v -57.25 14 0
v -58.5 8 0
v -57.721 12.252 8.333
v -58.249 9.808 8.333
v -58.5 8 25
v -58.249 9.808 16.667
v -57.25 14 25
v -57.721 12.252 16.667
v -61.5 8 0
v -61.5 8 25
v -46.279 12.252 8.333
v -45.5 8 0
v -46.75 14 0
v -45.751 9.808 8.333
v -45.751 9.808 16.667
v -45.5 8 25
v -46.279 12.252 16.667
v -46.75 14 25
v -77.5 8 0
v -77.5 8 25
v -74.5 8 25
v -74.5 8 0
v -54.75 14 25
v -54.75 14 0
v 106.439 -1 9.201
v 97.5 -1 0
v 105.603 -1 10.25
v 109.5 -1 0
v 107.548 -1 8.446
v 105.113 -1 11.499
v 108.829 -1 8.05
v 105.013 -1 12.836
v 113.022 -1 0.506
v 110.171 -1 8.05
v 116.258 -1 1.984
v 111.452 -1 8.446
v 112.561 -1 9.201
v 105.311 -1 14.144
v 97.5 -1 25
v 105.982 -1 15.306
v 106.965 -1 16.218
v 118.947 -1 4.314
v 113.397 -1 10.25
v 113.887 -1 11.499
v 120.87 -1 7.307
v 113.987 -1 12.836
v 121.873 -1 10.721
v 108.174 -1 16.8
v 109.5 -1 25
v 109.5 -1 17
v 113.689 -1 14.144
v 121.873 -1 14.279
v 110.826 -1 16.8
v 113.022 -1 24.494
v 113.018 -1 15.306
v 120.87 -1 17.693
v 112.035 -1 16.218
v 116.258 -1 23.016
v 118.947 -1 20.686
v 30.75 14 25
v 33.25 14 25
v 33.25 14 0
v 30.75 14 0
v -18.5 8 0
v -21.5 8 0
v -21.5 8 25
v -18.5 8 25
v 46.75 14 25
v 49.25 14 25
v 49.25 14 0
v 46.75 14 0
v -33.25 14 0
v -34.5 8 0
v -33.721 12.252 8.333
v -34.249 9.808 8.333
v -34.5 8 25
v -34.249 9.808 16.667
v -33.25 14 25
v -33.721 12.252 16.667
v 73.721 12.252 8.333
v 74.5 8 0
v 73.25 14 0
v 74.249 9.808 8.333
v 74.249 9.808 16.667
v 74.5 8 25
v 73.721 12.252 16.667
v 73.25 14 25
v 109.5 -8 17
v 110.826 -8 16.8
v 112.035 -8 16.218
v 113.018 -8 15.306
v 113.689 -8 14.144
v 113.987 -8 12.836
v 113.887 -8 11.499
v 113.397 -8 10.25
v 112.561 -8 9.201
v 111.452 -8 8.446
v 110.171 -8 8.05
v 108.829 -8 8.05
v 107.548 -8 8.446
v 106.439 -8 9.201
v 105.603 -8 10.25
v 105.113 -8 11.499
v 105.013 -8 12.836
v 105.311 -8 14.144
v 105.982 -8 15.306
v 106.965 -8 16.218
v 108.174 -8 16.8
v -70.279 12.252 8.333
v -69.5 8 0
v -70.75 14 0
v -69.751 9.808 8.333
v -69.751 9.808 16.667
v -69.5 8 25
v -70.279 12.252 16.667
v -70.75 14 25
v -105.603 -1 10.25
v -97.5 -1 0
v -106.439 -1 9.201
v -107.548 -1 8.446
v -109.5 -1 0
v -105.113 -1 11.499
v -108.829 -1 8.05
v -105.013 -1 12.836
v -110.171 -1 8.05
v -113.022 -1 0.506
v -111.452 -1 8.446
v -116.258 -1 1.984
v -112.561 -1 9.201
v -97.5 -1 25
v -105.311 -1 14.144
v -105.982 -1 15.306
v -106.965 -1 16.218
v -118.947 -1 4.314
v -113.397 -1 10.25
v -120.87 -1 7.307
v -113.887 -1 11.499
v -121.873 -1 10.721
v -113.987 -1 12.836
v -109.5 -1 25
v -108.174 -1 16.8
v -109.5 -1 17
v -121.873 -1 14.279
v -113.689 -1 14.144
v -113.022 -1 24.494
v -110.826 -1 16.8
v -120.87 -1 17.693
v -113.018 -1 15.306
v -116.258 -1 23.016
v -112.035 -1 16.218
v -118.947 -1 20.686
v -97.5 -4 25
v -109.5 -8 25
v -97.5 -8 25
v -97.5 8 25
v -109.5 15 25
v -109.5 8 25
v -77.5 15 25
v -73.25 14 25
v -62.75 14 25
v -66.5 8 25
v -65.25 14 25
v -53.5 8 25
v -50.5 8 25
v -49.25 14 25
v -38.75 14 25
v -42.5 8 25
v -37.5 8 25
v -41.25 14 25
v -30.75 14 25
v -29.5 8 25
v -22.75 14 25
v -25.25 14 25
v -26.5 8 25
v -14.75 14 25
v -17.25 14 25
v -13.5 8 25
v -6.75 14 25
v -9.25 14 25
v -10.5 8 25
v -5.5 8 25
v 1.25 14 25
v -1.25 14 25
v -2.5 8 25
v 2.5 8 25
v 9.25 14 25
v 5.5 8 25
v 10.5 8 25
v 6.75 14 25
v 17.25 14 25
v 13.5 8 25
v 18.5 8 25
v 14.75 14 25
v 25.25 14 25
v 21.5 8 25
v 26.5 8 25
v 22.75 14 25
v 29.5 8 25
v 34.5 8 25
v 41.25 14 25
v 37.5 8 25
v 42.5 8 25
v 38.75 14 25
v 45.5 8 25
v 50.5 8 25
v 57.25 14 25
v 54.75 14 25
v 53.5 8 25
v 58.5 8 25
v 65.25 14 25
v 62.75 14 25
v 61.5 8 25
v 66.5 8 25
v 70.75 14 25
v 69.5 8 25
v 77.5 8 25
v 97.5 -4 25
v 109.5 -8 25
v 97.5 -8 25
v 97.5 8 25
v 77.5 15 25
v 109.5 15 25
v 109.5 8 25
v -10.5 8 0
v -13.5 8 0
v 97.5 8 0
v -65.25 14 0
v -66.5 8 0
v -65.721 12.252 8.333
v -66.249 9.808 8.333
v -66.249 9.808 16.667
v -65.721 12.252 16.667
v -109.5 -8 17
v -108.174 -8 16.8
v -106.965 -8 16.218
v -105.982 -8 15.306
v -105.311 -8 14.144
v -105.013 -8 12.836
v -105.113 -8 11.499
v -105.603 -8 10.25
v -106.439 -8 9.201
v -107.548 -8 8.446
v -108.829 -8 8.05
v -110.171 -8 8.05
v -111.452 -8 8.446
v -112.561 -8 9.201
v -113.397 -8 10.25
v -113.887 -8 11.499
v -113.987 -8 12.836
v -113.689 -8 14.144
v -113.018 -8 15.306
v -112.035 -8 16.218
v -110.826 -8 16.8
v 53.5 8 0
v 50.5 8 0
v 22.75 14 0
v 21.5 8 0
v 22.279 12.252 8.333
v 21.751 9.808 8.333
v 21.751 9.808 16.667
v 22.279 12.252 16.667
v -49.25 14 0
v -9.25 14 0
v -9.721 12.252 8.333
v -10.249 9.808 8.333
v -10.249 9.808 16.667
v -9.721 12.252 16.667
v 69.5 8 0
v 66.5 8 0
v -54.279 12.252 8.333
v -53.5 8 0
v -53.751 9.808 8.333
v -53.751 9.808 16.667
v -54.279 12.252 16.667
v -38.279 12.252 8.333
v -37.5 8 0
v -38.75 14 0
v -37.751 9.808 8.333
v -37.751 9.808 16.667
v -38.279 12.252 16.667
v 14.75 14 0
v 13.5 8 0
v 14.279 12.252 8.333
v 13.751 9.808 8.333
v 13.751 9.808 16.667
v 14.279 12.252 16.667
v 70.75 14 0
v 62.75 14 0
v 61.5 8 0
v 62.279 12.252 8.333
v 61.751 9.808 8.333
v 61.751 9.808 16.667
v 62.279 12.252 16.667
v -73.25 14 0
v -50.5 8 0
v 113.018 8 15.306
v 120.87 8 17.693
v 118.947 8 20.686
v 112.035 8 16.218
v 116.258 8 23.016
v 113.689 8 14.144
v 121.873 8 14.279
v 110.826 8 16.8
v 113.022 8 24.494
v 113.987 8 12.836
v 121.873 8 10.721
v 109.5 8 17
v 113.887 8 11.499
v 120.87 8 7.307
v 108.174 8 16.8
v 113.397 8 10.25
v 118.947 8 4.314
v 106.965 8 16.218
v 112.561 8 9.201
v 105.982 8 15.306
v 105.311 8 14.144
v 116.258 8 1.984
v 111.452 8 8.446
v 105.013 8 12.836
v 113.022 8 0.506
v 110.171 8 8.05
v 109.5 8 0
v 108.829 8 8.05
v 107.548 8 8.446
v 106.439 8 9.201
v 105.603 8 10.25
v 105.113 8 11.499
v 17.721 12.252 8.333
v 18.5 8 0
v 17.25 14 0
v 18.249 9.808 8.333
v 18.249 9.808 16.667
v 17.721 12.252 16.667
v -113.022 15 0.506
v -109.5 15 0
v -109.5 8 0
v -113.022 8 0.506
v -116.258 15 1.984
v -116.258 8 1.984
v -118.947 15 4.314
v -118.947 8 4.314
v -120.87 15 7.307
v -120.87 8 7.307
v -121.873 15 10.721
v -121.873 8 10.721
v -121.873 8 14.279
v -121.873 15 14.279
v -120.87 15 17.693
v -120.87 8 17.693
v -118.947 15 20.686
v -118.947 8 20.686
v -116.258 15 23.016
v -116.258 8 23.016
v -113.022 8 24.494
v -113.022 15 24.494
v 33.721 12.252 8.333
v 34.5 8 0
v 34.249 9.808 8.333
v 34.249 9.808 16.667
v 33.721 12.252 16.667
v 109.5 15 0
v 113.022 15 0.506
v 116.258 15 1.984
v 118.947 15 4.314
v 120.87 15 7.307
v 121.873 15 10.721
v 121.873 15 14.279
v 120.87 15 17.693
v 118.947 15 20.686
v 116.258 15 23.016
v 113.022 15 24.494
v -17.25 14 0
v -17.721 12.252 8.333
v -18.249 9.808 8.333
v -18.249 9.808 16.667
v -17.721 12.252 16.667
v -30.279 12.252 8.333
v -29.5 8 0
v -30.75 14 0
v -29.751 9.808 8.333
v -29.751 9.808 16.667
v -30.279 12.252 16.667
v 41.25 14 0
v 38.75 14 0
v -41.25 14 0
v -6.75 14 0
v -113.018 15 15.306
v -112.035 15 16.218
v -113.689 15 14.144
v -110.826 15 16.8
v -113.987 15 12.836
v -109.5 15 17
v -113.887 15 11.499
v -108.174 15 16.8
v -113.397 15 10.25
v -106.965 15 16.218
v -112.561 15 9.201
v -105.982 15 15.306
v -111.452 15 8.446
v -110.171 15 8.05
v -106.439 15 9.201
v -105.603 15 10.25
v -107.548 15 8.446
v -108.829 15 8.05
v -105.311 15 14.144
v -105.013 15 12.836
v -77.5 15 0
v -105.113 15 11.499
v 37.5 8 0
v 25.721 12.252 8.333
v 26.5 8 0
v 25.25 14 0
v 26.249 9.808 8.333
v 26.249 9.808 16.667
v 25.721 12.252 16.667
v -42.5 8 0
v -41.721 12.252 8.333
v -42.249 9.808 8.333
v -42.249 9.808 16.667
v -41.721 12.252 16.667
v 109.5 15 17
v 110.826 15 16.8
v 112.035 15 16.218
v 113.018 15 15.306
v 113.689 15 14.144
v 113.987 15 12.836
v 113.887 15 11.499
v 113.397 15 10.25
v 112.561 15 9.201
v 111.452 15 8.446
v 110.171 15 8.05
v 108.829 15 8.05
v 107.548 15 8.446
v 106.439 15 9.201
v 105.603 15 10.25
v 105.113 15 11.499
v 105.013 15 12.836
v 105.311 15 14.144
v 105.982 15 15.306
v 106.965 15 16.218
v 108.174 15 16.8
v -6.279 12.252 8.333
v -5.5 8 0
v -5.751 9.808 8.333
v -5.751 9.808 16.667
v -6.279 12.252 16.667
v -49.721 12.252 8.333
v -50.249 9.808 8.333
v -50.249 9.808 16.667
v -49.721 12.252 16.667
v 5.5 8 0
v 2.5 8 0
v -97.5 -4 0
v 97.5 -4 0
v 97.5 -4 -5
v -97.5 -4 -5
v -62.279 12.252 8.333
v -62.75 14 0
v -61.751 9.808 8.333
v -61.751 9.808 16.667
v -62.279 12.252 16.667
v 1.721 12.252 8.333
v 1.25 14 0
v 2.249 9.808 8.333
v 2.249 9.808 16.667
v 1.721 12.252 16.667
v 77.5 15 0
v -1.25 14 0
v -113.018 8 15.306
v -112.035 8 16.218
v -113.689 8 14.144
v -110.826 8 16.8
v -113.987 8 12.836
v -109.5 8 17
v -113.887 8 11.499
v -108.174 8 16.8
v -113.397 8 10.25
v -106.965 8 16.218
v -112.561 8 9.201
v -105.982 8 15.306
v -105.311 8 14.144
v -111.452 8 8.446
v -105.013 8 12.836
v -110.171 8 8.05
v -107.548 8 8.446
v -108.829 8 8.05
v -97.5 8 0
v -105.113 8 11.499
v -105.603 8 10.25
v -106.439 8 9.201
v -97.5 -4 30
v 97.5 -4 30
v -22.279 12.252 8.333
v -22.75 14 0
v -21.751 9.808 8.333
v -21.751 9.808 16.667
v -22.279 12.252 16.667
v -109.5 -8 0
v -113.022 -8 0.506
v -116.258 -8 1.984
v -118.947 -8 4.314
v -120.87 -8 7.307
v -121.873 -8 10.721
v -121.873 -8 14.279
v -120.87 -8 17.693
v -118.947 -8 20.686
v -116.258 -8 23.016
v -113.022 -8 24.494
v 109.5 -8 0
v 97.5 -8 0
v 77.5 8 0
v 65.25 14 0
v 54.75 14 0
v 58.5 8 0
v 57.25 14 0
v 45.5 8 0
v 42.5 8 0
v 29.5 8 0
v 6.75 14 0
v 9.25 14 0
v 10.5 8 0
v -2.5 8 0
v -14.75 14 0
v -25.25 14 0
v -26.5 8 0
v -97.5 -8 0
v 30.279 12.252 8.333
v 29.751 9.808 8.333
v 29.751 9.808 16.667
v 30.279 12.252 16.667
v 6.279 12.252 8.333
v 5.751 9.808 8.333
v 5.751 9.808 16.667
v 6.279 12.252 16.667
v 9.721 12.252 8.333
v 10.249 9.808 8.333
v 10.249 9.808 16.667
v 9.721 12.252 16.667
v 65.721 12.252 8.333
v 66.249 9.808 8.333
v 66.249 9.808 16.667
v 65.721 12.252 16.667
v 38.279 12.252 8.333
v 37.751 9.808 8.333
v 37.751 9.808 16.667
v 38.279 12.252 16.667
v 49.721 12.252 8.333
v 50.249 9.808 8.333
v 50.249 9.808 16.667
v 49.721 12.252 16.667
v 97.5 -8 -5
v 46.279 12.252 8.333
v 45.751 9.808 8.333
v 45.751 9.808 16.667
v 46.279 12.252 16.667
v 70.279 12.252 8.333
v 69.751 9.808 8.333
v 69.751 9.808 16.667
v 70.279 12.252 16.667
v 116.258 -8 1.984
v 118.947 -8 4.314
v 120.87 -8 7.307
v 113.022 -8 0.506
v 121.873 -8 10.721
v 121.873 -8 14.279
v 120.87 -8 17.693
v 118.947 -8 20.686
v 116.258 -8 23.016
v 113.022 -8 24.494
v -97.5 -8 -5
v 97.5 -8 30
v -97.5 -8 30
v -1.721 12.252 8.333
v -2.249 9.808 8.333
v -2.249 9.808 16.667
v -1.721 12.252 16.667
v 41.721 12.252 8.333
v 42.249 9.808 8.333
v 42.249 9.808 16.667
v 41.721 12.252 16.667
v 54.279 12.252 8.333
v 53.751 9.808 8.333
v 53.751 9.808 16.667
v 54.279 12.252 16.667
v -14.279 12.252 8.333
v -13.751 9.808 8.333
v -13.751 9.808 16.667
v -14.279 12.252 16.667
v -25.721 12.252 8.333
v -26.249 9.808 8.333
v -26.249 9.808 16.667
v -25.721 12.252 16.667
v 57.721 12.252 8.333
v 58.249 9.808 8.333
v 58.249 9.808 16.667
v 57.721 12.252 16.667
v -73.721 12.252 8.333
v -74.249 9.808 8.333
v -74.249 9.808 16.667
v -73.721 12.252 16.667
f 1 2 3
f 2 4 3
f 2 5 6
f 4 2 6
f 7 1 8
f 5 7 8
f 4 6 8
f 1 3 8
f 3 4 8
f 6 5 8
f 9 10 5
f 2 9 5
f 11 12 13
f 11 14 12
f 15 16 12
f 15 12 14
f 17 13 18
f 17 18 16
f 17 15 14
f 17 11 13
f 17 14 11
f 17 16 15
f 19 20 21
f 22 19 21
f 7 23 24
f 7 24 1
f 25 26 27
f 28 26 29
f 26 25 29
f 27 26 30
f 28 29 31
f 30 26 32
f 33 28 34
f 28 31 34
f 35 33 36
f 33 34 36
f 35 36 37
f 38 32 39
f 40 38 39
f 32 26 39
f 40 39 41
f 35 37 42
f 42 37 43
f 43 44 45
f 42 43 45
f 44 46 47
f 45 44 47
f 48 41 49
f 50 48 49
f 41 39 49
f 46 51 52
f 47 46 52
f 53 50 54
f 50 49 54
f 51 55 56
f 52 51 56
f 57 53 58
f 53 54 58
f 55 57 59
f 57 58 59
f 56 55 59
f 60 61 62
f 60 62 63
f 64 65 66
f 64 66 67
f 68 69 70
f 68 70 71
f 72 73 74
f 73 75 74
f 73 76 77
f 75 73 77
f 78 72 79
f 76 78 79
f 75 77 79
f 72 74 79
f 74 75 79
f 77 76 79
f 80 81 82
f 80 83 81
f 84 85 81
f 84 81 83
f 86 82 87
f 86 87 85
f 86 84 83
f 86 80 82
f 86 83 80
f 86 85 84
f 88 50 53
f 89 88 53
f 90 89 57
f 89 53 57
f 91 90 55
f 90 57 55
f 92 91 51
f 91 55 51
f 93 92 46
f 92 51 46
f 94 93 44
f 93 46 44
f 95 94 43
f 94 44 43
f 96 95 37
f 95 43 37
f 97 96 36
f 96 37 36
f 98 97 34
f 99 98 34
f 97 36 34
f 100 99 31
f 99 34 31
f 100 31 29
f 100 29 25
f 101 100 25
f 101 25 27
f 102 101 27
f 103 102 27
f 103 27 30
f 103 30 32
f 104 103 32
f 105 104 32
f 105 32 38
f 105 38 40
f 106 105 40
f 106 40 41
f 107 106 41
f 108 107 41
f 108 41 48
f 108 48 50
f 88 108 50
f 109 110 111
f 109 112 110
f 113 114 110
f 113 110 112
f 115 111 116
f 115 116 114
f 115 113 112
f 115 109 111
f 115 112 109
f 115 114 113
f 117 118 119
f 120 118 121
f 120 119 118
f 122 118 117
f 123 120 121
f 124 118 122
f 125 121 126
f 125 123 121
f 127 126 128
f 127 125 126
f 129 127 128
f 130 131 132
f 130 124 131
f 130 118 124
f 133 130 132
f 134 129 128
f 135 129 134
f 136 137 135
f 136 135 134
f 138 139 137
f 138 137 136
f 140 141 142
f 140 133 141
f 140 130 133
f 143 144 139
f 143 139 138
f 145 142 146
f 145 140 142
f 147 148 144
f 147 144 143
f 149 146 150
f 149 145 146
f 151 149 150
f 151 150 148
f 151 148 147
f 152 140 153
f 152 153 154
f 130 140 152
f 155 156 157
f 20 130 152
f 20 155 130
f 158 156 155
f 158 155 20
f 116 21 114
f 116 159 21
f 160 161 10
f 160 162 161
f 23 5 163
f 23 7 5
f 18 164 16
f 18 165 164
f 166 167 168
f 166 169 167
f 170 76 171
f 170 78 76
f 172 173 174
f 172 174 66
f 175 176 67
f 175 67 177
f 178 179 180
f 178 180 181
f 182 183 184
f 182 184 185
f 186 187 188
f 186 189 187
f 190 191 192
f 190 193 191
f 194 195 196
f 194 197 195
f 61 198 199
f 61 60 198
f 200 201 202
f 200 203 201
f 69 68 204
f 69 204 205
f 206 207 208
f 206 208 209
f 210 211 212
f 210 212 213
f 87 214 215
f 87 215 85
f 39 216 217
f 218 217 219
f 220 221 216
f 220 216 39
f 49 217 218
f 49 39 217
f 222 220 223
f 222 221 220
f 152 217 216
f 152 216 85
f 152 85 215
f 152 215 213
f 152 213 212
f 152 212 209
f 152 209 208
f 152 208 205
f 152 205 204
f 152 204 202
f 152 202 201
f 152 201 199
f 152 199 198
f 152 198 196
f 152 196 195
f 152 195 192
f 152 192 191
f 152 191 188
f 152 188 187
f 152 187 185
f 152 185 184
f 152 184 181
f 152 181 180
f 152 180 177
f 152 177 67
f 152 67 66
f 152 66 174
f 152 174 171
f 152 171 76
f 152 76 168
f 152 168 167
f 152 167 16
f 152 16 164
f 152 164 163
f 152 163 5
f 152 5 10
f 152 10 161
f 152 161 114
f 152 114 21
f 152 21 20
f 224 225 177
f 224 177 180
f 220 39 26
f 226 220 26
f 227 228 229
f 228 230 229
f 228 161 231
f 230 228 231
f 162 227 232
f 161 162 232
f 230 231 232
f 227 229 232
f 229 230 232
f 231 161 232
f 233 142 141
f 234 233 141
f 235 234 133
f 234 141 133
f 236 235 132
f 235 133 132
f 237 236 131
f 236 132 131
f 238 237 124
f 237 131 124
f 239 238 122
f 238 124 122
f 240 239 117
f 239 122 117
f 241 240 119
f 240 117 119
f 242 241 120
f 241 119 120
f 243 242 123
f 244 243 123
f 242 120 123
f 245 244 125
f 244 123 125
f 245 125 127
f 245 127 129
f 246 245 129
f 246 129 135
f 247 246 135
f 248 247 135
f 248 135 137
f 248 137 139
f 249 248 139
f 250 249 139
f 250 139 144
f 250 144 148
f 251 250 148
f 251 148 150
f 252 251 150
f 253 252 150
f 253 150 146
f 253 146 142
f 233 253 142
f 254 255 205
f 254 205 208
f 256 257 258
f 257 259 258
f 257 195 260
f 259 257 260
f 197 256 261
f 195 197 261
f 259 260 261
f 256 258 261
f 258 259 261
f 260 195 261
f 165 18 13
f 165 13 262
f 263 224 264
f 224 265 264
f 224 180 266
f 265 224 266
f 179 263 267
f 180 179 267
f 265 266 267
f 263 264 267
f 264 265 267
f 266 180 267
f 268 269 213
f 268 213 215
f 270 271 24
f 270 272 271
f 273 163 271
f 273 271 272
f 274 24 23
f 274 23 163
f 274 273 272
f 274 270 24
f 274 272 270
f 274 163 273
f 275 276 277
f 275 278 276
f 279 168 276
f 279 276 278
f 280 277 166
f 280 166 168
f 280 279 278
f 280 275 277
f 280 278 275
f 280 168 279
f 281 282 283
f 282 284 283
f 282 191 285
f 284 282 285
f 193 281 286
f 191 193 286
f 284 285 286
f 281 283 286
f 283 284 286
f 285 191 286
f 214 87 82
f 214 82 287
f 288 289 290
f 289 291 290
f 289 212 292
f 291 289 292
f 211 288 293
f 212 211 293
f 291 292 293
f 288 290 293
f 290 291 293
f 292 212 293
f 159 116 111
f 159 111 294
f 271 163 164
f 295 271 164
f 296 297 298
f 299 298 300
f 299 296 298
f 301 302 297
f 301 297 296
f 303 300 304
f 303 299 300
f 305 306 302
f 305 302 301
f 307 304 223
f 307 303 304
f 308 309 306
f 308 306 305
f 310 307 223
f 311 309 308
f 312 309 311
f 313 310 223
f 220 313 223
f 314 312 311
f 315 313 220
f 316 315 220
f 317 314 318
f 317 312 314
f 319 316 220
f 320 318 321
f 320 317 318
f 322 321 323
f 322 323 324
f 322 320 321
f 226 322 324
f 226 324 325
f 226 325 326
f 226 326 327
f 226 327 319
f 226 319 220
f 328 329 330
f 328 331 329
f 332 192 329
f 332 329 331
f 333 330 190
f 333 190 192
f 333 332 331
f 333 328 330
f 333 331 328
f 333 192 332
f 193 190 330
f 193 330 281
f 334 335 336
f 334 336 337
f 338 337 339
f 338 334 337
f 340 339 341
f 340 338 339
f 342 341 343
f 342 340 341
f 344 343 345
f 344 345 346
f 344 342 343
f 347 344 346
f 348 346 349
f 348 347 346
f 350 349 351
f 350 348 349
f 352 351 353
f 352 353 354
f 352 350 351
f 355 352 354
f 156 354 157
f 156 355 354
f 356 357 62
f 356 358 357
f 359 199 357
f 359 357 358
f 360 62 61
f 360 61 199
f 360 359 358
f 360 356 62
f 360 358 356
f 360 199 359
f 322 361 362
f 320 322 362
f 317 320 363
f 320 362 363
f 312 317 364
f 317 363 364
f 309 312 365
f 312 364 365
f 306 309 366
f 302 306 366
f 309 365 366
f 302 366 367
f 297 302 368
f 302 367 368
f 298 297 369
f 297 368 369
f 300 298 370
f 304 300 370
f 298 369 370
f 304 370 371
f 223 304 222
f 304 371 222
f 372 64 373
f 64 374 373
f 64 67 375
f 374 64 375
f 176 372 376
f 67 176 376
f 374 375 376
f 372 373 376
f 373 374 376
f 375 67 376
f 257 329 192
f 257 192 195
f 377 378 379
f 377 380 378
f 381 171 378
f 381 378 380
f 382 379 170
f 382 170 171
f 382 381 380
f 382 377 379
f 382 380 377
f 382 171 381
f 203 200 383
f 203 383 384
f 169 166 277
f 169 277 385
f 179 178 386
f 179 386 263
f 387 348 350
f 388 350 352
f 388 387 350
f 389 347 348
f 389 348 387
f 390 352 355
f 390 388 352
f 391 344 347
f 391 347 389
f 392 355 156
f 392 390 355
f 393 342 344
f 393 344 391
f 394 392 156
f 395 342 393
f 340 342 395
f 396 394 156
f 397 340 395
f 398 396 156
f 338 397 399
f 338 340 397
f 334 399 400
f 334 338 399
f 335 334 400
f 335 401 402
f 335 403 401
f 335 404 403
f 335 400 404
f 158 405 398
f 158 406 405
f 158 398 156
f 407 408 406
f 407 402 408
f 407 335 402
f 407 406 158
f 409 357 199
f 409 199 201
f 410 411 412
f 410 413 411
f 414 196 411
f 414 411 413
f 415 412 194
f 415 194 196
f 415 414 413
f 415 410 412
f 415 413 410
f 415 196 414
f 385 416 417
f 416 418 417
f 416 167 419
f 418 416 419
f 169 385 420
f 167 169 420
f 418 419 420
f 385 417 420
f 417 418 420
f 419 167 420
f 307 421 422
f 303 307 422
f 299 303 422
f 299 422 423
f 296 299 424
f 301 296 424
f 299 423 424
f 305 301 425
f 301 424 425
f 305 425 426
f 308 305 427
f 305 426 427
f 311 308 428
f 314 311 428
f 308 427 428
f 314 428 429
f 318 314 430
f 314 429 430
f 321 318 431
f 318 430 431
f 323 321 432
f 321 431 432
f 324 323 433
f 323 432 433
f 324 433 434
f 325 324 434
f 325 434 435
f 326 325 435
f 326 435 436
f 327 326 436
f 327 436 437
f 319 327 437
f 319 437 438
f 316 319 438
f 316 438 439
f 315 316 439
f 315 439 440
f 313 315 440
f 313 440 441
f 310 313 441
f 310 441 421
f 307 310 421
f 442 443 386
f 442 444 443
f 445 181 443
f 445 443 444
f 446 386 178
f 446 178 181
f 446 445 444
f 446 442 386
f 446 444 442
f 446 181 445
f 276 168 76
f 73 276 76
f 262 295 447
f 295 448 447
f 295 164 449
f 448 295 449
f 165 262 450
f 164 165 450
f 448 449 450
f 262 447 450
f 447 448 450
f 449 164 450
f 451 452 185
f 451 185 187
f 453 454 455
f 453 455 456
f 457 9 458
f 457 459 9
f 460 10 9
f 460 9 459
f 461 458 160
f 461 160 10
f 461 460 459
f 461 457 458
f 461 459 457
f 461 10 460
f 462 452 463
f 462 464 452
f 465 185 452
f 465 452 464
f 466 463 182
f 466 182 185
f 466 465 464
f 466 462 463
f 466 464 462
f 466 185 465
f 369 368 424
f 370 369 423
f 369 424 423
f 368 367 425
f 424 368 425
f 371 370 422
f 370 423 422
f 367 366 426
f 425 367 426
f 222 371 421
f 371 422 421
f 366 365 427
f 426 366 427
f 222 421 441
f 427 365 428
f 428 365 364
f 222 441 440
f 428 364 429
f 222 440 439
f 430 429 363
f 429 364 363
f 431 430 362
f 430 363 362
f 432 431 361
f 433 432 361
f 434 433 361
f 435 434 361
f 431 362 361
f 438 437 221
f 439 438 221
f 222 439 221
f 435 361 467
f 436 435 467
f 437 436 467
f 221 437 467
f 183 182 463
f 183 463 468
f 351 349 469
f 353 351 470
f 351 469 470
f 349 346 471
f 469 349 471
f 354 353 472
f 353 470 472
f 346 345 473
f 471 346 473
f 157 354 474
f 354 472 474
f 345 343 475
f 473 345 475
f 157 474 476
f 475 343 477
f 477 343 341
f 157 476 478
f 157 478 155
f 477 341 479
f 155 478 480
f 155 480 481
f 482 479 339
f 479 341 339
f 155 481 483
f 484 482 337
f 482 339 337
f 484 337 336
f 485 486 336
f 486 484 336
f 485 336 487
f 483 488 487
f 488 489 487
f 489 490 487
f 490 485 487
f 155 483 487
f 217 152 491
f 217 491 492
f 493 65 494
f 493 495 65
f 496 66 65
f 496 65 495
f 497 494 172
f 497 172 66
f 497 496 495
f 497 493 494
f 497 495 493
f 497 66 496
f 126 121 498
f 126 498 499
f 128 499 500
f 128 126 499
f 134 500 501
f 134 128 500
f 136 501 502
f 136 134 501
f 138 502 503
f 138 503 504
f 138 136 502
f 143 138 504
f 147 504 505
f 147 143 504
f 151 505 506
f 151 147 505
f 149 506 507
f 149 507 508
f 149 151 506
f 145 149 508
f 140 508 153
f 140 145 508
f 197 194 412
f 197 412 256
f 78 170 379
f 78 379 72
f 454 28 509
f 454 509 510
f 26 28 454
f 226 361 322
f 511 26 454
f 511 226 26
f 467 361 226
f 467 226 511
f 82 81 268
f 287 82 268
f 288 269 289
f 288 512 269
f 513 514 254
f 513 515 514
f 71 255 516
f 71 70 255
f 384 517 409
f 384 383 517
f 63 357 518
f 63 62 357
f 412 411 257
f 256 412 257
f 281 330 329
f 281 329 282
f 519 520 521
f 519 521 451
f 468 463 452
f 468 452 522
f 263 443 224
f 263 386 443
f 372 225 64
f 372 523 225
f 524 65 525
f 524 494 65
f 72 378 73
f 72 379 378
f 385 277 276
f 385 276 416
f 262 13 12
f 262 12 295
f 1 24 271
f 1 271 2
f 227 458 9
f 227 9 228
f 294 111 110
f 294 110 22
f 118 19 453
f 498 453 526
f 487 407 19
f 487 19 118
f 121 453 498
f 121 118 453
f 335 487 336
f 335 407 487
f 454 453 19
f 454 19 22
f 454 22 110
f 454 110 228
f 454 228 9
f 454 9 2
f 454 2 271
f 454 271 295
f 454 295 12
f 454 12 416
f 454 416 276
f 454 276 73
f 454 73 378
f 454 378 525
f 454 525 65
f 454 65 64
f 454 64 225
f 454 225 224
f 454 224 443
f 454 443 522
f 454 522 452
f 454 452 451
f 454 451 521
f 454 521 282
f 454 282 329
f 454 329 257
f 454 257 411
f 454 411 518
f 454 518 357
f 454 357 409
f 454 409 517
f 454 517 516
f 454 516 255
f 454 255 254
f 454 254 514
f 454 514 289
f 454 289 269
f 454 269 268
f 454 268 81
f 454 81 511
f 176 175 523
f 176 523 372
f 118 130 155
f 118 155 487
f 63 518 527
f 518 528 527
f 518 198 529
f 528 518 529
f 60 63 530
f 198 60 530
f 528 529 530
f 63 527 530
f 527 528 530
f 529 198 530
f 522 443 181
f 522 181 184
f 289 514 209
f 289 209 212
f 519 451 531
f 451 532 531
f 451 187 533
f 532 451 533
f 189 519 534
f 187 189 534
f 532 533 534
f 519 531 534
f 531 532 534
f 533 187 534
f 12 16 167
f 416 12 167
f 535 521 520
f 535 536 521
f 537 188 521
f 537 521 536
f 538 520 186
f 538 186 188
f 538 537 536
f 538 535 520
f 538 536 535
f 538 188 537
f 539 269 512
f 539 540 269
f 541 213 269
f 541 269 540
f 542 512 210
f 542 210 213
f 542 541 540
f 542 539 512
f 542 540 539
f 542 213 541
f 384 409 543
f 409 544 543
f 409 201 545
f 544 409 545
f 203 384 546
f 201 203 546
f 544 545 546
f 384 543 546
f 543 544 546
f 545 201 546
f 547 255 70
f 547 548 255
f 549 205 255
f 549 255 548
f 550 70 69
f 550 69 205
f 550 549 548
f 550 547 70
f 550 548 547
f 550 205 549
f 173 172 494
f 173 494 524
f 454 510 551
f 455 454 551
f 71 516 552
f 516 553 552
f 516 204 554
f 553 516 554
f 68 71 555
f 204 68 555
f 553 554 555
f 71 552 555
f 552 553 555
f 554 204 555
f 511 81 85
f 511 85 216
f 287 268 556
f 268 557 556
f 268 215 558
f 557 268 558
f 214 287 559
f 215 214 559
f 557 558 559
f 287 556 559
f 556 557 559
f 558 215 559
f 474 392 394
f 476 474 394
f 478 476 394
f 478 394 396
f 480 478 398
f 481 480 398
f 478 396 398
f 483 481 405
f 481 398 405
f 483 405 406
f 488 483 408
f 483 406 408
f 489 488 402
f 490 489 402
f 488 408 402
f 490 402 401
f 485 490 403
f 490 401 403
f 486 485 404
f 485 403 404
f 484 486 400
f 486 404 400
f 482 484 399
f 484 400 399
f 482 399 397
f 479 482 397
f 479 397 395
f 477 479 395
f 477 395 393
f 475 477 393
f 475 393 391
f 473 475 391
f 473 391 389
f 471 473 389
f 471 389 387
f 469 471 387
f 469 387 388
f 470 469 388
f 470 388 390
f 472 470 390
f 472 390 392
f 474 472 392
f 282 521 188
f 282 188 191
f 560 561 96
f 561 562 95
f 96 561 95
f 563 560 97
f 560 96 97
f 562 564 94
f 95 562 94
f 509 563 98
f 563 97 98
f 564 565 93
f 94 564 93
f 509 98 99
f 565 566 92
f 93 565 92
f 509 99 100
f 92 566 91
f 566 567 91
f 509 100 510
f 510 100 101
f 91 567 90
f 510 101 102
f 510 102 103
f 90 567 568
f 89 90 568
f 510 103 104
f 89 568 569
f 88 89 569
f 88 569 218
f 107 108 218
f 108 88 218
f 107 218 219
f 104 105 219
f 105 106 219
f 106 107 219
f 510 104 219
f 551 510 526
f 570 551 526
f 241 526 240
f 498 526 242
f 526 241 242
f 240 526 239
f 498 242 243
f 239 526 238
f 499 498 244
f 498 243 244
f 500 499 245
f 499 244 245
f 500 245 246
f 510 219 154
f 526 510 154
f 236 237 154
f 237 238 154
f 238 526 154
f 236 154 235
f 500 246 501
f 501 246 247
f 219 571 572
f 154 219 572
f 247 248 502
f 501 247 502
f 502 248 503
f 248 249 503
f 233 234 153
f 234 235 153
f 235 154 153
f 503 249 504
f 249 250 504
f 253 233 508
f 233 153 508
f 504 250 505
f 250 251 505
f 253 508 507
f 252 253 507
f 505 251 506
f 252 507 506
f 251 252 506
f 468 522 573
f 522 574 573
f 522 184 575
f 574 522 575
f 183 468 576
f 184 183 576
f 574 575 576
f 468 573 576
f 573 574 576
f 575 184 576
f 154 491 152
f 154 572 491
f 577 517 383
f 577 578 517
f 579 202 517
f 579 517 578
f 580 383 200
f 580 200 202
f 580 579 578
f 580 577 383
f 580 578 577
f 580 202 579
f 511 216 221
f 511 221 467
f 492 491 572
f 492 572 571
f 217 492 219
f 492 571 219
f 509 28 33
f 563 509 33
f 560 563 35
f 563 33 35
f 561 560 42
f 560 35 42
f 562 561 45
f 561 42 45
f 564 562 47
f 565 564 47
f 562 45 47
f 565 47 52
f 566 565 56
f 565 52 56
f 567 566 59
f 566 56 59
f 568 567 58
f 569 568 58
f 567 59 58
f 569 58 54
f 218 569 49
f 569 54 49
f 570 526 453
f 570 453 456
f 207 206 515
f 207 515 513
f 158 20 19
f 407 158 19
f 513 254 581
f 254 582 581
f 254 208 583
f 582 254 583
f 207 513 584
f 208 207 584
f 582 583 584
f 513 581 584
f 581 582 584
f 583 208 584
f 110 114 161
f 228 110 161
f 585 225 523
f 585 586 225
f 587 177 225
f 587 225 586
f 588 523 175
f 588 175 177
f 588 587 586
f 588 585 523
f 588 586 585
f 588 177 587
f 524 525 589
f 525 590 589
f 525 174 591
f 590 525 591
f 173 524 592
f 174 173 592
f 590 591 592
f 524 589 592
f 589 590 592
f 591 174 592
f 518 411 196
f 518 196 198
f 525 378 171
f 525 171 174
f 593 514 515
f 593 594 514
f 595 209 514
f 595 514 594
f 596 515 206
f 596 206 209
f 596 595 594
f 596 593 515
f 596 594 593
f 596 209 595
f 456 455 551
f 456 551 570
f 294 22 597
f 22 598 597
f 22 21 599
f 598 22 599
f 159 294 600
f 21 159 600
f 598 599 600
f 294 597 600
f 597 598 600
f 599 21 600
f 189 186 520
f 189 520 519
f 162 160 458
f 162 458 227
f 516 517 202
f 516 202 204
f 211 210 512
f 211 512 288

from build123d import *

# Parameters (mm, degrees)
SKETCH_1_W             = 195
SKETCH_1_H             = 16
EXTRUDE_1_DEPTH        = 25
EXTRUDE_2_DEPTH        = 25
PATTERN_LINEAR_1_COUNT = 10
PATTERN_LINEAR_1_PITCH = 8
PATTERN_LINEAR_2_COUNT = 10
PATTERN_LINEAR_2_PITCH = 8
SKETCH_3_W             = 195
SKETCH_3_H             = 4
EXTRUDE_3_DEPTH        = 5
SKETCH_5_W             = 195
SKETCH_5_H             = 4
EXTRUDE_4_DEPTH        = 5
SKETCH_6_W             = 20
SKETCH_6_H             = 25
EXTRUDE_5_DEPTH        = 7
EXTRUDE_6_DEPTH        = 7
EXTRUDE_START          = -7
EXTRUDE_7_DEPTH        = 7
SKETCH_9_R             = 4.5
CUT_EXTRUDE_1_DEPTH    = 50
SKETCH_10_R            = 4.5
CUT_EXTRUDE_2_DEPTH    = 50


with BuildPart() as part:
    # 草图1 → 凸台-拉伸1 (new body)
    with BuildSketch(Plane.XY):
        Rectangle(SKETCH_1_W, SKETCH_1_H)
    extrude(amount=EXTRUDE_1_DEPTH)

    # 草图2 → 凸台-拉伸2 (add)
    with BuildSketch(Plane.XY.offset(25)):
        with BuildLine():
            Line((-2.5, 8), (2.5, 8))
            add(Edge.make_bspline(
                [(2.5, 8), (2.5, 9.044984292), (1.579923026, 13.044978727), (1.25, 14)],
                knots=[0, 0, 0, 0, 0.806888018, 0.806888018, 0.806888018, 0.806888018], degree=3))
            Line((1.25, 14), (-1.25, 14))
            add(Edge.make_bspline(
                [(-2.5, 8), (-2.5, 9.044984292), (-1.579923026, 13.044978727), (-1.25, 14)],
                knots=[0, 0, 0, 0, 0.806888018, 0.806888018, 0.806888018, 0.806888018], degree=3))
        make_face()
    extrude_2 = extrude(amount=-EXTRUDE_2_DEPTH)

    # 阵列(线性)1: 凸台-拉伸2 ×10
    with Locations(*[(-i * PATTERN_LINEAR_1_PITCH, 0, 0) for i in range(1, PATTERN_LINEAR_1_COUNT)]):
        add(extrude_2)

    # 阵列(线性)2: 凸台-拉伸2 ×10
    with Locations(*[(i * PATTERN_LINEAR_2_PITCH, 0, 0) for i in range(1, PATTERN_LINEAR_2_COUNT)]):
        add(extrude_2)

    # 草图3 → 凸台-拉伸3 (add)
    with BuildSketch(Plane.XY.offset(25)):
        with Locations((0, -6)):
            Rectangle(SKETCH_3_W, SKETCH_3_H)
    extrude(amount=EXTRUDE_3_DEPTH)

    # 草图5 → 凸台-拉伸4 (add)
    with BuildSketch(Plane(origin=(0, 0, 0), x_dir=(-1, 0, 0), z_dir=(0, 0, -1))):
        with Locations((0, -6)):
            Rectangle(SKETCH_5_W, SKETCH_5_H)
    extrude(amount=EXTRUDE_4_DEPTH)

    # 草图6 → 凸台-拉伸5 (add)
    with BuildSketch(Plane(origin=(0, 8, 0), x_dir=(1, 0, 0), z_dir=(0, 1, 0))):
        with Locations((87.5, -12.5)):
            Rectangle(SKETCH_6_W, SKETCH_6_H)
    extrude_5 = extrude(amount=EXTRUDE_5_DEPTH)

    # 草图7 → 凸台-拉伸6 (add)
    with BuildSketch(Plane(origin=(0, 15, 0), x_dir=(1, 0, 0), z_dir=(0, 1, 0))):
        with BuildLine():
            Line((97.5, 0), (109.5, 0))
            ThreePointArc((109.5, 0), (122, -12.5), (109.5, -25))
            Line((109.5, -25), (97.5, -25))
            Line((97.5, -25), (97.5, 0))
        make_face()
    extrude_6 = extrude(amount=-EXTRUDE_6_DEPTH)

    # 镜向1: 凸台-拉伸5, 凸台-拉伸6 across plane
    add(extrude_5.mirror(Plane(origin=(0, 0, 0), x_dir=(0, 0, 1), z_dir=(1, 0, 0))))
    add(extrude_6.mirror(Plane(origin=(0, 0, 0), x_dir=(0, 0, 1), z_dir=(1, 0, 0))))

    # 草图8 → 凸台-拉伸7 (add)
    with BuildSketch(Plane.XZ.offset(8).offset(EXTRUDE_START)):
        with BuildLine():
            Line((97.5, 25), (97.5, 0))
            Line((97.5, 0), (109.5, 0))
            ThreePointArc((109.5, 0), (122, 12.5), (109.5, 25))
            Line((109.5, 25), (97.5, 25))
        make_face()
    extrude_7 = extrude(amount=EXTRUDE_7_DEPTH)

    # 镜向2: 凸台-拉伸7 across plane
    add(extrude_7.mirror(Plane(origin=(0, 0, 0), x_dir=(0, 0, 1), z_dir=(1, 0, 0))))

    # 草图9 → 切除-拉伸1 (cut)
    with BuildSketch(Plane(origin=(0, 15, 0), x_dir=(1, 0, 0), z_dir=(0, 1, 0))):
        with Locations((-109.5, -12.5)):
            Circle(SKETCH_9_R)
    extrude(amount=-CUT_EXTRUDE_1_DEPTH, mode=Mode.SUBTRACT)

    # 草图10 → 切除-拉伸2 (cut)
    with BuildSketch(Plane(origin=(0, 15, 0), x_dir=(1, 0, 0), z_dir=(0, 1, 0))):
        with Locations((109.5, -12.5)):
            Circle(SKETCH_10_R)
    extrude(amount=-CUT_EXTRUDE_2_DEPTH, mode=Mode.SUBTRACT)


solid = part.part
